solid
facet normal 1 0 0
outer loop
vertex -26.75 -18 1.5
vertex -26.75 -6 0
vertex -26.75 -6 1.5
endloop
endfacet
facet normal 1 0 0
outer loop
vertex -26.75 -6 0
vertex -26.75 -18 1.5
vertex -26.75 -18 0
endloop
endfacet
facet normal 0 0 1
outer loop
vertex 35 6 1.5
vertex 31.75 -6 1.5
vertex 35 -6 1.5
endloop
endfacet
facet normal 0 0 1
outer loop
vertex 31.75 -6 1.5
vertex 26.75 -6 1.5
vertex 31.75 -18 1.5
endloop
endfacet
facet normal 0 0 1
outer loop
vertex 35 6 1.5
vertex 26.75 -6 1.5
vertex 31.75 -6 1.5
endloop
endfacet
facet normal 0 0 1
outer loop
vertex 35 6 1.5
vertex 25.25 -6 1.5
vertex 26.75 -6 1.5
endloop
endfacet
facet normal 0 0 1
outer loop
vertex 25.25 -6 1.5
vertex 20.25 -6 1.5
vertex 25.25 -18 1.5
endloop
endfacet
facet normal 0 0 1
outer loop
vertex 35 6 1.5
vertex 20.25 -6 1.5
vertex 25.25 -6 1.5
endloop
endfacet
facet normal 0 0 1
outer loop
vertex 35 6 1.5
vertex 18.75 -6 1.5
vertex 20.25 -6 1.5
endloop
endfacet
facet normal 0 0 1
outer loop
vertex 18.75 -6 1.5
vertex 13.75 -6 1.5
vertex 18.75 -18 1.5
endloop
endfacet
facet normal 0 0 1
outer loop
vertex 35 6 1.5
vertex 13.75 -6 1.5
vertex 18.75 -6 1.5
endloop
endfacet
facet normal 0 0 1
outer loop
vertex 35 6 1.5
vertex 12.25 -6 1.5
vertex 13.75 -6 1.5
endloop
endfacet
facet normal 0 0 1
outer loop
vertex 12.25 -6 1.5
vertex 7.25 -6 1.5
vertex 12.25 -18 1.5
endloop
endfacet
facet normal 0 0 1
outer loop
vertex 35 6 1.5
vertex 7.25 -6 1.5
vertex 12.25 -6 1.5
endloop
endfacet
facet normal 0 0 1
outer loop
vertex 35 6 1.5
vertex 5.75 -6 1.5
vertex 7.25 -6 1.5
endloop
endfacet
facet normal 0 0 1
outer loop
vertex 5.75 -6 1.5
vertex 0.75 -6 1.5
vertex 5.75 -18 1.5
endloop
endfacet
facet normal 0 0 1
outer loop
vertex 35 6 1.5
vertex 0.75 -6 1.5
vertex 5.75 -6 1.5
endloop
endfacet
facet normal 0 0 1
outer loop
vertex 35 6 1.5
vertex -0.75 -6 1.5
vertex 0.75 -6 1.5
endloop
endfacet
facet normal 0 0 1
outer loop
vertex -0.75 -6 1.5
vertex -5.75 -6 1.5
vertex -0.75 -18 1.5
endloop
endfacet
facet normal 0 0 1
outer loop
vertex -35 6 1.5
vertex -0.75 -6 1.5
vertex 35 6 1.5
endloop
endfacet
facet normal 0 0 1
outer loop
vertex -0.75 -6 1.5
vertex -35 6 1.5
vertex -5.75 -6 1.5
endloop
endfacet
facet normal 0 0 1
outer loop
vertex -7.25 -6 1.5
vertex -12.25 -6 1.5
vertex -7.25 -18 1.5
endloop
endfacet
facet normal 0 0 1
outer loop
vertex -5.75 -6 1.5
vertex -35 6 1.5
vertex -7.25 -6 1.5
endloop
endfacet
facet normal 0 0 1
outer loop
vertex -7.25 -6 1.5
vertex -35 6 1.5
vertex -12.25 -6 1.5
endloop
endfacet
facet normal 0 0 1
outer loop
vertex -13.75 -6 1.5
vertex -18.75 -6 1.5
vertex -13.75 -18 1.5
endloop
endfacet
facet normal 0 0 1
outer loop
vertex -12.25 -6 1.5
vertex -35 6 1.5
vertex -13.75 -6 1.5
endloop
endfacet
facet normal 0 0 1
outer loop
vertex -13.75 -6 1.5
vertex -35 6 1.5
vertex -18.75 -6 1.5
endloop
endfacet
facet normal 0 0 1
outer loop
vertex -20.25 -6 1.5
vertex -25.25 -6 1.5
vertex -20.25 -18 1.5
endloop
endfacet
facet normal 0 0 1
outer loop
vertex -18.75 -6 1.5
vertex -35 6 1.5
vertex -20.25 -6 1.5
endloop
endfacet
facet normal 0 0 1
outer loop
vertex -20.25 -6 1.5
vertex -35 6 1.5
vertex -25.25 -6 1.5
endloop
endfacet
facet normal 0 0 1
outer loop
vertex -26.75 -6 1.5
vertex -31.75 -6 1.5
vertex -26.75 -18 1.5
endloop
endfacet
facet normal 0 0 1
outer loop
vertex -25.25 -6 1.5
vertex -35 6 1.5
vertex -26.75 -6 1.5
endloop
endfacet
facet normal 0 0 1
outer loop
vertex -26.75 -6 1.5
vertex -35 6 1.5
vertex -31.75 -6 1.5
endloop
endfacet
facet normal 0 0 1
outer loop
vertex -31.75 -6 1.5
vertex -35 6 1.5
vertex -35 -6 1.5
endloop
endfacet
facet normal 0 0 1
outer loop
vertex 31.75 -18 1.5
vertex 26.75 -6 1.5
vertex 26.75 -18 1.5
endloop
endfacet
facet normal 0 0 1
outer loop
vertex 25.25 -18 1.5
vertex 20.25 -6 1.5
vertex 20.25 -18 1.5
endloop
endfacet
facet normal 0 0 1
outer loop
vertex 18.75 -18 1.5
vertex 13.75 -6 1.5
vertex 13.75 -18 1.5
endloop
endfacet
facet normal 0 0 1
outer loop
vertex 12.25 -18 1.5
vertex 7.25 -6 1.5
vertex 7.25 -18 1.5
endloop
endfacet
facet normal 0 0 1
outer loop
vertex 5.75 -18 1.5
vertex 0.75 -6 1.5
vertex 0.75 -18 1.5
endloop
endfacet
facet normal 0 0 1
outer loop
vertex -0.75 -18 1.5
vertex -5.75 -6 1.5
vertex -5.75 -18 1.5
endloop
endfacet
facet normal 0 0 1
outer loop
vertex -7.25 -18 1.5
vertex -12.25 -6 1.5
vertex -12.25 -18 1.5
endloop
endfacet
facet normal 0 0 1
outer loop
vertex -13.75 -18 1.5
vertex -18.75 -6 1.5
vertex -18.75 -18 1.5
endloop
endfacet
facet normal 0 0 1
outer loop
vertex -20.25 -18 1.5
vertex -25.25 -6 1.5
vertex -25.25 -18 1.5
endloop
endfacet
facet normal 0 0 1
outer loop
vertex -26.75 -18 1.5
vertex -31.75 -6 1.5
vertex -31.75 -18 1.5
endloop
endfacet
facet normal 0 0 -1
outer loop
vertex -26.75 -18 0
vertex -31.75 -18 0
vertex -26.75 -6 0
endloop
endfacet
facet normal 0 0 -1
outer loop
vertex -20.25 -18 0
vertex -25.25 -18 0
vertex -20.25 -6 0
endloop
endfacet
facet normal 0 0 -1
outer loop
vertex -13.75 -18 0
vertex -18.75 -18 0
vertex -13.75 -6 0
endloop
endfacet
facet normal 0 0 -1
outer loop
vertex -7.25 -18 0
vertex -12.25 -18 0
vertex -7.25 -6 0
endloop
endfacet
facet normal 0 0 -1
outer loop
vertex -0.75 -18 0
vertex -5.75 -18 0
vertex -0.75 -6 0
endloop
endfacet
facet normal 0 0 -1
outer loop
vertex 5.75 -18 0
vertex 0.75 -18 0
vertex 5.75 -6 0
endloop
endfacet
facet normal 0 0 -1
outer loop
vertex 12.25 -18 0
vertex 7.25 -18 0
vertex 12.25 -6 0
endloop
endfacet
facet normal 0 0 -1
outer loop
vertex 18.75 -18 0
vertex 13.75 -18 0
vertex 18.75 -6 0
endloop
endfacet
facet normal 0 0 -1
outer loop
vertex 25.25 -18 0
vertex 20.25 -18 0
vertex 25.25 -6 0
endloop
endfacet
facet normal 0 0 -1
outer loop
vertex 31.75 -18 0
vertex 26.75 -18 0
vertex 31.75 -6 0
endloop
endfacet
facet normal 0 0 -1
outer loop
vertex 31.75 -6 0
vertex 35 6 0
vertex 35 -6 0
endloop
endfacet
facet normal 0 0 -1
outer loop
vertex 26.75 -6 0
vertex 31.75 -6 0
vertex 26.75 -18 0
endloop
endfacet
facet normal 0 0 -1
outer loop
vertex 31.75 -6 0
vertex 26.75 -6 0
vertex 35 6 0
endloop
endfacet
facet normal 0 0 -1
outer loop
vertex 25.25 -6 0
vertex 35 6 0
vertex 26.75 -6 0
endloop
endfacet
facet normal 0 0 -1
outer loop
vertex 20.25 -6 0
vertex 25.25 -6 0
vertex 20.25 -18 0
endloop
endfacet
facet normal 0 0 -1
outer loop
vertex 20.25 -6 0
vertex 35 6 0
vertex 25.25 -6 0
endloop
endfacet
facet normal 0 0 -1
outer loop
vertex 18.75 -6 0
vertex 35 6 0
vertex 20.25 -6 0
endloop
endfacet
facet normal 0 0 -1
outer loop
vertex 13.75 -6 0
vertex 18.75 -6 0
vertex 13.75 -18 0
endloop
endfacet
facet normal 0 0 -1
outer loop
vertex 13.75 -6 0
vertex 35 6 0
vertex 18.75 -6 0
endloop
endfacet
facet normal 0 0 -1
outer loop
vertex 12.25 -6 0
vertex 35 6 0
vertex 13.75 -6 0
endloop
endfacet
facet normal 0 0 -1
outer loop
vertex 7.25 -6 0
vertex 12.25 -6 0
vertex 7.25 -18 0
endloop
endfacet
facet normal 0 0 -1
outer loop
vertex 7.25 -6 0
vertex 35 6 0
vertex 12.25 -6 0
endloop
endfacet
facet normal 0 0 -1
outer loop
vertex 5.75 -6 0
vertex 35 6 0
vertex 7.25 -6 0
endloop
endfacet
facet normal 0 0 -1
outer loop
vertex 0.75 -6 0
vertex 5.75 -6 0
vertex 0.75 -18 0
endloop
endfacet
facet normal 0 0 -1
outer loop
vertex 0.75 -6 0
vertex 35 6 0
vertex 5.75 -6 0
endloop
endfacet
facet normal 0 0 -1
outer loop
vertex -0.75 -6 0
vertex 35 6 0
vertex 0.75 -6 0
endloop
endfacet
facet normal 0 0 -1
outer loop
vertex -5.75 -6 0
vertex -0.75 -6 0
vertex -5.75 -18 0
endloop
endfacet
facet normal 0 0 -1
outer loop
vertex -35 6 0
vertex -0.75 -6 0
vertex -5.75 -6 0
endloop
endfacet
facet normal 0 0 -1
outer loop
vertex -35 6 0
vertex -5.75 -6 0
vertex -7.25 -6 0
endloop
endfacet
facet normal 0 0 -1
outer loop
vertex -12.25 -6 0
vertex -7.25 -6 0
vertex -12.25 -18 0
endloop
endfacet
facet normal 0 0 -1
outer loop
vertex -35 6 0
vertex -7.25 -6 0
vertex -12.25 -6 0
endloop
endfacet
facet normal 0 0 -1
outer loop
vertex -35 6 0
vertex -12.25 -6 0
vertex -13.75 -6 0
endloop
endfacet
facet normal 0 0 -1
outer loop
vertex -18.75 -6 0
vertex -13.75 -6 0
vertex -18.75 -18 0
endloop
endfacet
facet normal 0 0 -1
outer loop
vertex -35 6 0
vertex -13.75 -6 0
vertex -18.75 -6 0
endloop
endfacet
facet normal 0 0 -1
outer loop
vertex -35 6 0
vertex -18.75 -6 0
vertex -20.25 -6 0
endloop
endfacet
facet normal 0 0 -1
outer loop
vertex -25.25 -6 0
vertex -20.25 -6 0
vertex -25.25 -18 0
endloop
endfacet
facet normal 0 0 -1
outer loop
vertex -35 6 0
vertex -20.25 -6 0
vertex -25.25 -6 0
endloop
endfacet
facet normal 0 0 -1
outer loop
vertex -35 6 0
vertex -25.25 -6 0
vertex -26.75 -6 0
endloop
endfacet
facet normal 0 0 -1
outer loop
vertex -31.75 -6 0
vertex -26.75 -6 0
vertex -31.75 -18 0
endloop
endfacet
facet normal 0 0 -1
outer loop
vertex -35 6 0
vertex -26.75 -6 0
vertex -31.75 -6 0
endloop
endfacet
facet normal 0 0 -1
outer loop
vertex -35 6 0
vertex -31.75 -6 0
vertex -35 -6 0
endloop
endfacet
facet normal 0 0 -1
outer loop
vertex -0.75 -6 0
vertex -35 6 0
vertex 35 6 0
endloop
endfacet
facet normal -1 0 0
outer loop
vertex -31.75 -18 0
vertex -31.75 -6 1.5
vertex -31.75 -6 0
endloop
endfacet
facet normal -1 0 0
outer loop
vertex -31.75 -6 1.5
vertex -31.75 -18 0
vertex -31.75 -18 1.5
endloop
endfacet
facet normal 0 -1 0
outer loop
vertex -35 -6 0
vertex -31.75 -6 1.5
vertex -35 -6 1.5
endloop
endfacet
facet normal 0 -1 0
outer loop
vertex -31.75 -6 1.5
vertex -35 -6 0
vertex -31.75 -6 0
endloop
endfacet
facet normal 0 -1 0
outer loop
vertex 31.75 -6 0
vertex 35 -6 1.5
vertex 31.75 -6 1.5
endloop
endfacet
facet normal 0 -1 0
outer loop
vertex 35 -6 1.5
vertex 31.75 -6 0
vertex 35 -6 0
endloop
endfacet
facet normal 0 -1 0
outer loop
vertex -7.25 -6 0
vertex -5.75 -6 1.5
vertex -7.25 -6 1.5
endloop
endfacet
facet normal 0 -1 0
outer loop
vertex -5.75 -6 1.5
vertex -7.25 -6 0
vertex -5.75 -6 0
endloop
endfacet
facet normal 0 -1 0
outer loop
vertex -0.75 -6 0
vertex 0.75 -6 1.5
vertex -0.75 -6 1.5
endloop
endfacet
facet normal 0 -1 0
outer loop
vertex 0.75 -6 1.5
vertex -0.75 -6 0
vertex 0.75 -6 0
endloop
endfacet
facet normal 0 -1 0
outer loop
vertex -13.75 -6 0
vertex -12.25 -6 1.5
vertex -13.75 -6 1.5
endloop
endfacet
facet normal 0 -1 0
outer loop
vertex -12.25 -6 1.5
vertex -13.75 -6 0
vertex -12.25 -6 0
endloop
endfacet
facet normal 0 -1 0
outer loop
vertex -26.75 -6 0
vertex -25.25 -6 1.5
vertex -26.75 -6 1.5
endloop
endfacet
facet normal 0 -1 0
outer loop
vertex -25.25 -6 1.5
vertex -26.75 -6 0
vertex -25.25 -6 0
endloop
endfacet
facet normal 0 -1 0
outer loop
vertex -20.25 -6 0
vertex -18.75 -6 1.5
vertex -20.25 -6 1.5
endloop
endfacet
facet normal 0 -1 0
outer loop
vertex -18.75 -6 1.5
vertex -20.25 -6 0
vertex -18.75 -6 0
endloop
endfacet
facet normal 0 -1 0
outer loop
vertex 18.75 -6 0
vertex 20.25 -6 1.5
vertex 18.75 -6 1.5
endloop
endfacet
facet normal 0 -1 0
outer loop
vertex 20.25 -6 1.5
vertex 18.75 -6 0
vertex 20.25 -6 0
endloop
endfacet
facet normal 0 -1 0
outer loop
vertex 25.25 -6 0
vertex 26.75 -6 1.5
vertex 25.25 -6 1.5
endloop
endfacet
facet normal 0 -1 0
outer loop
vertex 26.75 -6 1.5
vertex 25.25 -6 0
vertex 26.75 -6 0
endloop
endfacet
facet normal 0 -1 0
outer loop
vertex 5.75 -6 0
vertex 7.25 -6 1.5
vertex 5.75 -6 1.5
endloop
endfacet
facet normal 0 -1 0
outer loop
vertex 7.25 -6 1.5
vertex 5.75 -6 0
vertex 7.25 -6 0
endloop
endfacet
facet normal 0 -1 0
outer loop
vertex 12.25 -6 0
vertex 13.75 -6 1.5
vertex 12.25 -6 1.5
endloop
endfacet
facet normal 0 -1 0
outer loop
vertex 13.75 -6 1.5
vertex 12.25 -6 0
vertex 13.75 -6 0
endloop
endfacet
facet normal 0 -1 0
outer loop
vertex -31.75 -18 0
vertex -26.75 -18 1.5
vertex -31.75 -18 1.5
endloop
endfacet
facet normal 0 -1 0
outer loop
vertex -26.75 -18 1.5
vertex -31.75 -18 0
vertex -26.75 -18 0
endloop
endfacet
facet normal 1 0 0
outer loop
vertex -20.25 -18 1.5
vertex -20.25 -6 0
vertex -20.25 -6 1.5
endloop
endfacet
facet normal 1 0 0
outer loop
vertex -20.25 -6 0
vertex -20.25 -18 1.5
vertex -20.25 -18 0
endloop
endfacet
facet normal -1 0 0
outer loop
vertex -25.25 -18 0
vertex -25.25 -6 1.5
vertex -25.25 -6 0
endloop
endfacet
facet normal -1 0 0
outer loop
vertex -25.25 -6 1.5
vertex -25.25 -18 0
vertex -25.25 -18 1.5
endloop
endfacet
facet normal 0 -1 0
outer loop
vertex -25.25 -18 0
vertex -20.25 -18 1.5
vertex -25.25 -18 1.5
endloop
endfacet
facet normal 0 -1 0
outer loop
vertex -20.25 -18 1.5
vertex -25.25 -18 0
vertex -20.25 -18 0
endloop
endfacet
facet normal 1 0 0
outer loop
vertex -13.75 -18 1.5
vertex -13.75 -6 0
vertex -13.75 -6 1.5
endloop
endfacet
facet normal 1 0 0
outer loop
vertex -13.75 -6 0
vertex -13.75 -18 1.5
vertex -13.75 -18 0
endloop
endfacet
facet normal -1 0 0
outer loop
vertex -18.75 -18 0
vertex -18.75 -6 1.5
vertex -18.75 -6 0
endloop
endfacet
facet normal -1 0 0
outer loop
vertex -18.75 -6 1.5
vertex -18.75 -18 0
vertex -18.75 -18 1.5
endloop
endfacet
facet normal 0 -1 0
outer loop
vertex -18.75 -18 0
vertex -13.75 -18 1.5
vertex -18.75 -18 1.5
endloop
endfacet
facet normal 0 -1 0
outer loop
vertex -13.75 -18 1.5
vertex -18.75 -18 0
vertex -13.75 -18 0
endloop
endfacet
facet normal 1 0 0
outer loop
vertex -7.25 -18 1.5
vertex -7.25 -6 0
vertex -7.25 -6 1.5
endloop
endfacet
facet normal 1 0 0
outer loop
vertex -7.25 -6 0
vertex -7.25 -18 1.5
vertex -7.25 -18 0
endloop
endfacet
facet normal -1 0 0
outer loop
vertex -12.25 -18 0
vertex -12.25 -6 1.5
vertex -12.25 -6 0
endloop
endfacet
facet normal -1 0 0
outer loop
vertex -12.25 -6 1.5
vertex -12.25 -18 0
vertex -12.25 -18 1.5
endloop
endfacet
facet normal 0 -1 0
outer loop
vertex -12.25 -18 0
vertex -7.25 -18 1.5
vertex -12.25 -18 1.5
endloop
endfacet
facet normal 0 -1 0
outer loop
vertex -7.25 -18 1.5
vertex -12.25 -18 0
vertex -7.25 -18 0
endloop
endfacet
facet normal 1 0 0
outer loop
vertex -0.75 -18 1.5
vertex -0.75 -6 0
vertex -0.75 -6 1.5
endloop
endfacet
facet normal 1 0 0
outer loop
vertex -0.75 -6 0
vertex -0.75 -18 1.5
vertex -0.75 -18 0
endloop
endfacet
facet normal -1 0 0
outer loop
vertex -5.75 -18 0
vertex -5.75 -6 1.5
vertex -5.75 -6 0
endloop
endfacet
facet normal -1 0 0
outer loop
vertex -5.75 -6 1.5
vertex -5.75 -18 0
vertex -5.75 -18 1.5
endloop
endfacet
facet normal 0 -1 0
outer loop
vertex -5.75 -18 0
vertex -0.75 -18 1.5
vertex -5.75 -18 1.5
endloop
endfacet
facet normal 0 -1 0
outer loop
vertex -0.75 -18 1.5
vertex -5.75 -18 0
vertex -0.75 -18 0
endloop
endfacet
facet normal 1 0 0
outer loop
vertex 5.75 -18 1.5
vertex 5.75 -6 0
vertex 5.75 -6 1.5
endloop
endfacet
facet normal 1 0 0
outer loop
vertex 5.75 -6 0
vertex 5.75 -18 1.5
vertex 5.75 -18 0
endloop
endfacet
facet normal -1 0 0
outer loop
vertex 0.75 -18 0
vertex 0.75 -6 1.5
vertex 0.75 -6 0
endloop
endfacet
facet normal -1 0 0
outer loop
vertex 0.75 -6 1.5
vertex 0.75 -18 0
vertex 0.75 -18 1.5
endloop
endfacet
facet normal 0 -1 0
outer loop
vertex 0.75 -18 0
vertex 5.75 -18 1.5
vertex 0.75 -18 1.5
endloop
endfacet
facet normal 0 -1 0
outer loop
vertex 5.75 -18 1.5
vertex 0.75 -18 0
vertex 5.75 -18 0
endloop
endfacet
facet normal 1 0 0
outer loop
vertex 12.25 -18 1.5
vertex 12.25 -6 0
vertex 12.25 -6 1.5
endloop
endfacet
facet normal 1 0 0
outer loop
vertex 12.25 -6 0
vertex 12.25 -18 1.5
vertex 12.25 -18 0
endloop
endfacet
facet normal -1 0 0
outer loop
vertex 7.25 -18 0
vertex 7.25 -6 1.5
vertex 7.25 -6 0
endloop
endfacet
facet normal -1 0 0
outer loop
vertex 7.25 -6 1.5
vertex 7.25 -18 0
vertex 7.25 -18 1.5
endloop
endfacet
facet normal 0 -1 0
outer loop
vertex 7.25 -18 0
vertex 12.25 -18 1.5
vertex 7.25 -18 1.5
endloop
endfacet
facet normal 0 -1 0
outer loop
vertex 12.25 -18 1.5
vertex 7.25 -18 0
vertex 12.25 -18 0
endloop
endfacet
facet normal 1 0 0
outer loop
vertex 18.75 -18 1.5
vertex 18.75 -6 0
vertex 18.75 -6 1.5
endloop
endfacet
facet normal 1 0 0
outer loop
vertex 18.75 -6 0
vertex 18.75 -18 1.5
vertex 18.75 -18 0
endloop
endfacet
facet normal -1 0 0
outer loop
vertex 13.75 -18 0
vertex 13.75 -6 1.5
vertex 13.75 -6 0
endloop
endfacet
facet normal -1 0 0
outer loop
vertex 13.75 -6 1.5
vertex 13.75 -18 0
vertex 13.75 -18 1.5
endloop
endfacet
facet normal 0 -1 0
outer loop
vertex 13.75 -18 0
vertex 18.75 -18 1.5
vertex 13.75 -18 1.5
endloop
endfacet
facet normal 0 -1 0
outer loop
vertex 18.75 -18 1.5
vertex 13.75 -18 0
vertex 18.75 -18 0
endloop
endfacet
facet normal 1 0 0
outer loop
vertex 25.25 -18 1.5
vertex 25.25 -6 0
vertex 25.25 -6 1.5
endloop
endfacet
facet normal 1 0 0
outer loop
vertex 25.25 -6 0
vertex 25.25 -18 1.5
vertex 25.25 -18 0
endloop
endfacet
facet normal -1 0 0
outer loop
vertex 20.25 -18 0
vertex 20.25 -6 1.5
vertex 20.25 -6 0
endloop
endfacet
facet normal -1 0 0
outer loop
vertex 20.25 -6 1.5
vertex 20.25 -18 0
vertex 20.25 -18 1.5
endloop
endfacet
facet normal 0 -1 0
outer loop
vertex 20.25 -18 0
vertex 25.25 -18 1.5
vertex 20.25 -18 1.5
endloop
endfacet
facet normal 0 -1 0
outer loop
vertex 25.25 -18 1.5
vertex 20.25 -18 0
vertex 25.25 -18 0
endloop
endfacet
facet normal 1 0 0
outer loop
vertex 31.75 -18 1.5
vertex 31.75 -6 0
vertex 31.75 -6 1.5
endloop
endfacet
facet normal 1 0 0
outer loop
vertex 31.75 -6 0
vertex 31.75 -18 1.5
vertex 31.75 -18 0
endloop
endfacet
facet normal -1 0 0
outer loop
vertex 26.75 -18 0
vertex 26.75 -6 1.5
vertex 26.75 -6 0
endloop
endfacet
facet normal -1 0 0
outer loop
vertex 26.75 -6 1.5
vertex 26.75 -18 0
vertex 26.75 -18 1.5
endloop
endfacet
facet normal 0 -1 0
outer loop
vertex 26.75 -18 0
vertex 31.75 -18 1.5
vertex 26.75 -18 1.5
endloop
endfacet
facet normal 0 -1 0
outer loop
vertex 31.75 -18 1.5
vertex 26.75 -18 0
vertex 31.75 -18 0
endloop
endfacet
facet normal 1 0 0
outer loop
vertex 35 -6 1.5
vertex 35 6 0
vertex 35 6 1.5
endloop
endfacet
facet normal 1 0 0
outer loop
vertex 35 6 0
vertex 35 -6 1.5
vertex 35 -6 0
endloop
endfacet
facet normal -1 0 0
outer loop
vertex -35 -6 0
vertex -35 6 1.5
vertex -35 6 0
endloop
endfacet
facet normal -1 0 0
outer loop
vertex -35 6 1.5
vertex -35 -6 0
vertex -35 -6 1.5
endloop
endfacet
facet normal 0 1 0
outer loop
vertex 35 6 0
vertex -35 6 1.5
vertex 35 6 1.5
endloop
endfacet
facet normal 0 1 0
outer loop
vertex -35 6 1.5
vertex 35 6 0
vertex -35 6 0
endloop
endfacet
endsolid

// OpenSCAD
$fn = 64; // resolution for cylinders and circles

// Dimensions (mm)
thickness = 1.5;          // Z
spine_length = 70;        // X
spine_width = 12;         // Y
tooth_width = 5;          // X
tooth_length = 12;        // Y
gap = 1.5;                // Y
num_teeth = 10;           // number of teeth

// Derived dimensions
total_teeth_width = num_teeth*tooth_width + (num_teeth-1)*gap; // 63.5 mm
spine_end_offset = (spine_length - total_teeth_width) / 2;      // 3.25 mm
tooth_start_x = -spine_length/2 + spine_end_offset;             // left edge of first tooth
tooth_start_y = -spine_width/2 - tooth_length;                    // teeth hang below the spine

// Build comb
union() {
    // Spine
    translate([ -spine_length/2, -spine_width/2, 0]) cube([spine_length, spine_width, thickness]);

    // Teeth
    for (i = [0:num_teeth-1]) {
        x = tooth_start_x + i*(tooth_width + gap);
        translate([x, tooth_start_y, 0]) cube([tooth_width, tooth_length, thickness]);
    }
}
